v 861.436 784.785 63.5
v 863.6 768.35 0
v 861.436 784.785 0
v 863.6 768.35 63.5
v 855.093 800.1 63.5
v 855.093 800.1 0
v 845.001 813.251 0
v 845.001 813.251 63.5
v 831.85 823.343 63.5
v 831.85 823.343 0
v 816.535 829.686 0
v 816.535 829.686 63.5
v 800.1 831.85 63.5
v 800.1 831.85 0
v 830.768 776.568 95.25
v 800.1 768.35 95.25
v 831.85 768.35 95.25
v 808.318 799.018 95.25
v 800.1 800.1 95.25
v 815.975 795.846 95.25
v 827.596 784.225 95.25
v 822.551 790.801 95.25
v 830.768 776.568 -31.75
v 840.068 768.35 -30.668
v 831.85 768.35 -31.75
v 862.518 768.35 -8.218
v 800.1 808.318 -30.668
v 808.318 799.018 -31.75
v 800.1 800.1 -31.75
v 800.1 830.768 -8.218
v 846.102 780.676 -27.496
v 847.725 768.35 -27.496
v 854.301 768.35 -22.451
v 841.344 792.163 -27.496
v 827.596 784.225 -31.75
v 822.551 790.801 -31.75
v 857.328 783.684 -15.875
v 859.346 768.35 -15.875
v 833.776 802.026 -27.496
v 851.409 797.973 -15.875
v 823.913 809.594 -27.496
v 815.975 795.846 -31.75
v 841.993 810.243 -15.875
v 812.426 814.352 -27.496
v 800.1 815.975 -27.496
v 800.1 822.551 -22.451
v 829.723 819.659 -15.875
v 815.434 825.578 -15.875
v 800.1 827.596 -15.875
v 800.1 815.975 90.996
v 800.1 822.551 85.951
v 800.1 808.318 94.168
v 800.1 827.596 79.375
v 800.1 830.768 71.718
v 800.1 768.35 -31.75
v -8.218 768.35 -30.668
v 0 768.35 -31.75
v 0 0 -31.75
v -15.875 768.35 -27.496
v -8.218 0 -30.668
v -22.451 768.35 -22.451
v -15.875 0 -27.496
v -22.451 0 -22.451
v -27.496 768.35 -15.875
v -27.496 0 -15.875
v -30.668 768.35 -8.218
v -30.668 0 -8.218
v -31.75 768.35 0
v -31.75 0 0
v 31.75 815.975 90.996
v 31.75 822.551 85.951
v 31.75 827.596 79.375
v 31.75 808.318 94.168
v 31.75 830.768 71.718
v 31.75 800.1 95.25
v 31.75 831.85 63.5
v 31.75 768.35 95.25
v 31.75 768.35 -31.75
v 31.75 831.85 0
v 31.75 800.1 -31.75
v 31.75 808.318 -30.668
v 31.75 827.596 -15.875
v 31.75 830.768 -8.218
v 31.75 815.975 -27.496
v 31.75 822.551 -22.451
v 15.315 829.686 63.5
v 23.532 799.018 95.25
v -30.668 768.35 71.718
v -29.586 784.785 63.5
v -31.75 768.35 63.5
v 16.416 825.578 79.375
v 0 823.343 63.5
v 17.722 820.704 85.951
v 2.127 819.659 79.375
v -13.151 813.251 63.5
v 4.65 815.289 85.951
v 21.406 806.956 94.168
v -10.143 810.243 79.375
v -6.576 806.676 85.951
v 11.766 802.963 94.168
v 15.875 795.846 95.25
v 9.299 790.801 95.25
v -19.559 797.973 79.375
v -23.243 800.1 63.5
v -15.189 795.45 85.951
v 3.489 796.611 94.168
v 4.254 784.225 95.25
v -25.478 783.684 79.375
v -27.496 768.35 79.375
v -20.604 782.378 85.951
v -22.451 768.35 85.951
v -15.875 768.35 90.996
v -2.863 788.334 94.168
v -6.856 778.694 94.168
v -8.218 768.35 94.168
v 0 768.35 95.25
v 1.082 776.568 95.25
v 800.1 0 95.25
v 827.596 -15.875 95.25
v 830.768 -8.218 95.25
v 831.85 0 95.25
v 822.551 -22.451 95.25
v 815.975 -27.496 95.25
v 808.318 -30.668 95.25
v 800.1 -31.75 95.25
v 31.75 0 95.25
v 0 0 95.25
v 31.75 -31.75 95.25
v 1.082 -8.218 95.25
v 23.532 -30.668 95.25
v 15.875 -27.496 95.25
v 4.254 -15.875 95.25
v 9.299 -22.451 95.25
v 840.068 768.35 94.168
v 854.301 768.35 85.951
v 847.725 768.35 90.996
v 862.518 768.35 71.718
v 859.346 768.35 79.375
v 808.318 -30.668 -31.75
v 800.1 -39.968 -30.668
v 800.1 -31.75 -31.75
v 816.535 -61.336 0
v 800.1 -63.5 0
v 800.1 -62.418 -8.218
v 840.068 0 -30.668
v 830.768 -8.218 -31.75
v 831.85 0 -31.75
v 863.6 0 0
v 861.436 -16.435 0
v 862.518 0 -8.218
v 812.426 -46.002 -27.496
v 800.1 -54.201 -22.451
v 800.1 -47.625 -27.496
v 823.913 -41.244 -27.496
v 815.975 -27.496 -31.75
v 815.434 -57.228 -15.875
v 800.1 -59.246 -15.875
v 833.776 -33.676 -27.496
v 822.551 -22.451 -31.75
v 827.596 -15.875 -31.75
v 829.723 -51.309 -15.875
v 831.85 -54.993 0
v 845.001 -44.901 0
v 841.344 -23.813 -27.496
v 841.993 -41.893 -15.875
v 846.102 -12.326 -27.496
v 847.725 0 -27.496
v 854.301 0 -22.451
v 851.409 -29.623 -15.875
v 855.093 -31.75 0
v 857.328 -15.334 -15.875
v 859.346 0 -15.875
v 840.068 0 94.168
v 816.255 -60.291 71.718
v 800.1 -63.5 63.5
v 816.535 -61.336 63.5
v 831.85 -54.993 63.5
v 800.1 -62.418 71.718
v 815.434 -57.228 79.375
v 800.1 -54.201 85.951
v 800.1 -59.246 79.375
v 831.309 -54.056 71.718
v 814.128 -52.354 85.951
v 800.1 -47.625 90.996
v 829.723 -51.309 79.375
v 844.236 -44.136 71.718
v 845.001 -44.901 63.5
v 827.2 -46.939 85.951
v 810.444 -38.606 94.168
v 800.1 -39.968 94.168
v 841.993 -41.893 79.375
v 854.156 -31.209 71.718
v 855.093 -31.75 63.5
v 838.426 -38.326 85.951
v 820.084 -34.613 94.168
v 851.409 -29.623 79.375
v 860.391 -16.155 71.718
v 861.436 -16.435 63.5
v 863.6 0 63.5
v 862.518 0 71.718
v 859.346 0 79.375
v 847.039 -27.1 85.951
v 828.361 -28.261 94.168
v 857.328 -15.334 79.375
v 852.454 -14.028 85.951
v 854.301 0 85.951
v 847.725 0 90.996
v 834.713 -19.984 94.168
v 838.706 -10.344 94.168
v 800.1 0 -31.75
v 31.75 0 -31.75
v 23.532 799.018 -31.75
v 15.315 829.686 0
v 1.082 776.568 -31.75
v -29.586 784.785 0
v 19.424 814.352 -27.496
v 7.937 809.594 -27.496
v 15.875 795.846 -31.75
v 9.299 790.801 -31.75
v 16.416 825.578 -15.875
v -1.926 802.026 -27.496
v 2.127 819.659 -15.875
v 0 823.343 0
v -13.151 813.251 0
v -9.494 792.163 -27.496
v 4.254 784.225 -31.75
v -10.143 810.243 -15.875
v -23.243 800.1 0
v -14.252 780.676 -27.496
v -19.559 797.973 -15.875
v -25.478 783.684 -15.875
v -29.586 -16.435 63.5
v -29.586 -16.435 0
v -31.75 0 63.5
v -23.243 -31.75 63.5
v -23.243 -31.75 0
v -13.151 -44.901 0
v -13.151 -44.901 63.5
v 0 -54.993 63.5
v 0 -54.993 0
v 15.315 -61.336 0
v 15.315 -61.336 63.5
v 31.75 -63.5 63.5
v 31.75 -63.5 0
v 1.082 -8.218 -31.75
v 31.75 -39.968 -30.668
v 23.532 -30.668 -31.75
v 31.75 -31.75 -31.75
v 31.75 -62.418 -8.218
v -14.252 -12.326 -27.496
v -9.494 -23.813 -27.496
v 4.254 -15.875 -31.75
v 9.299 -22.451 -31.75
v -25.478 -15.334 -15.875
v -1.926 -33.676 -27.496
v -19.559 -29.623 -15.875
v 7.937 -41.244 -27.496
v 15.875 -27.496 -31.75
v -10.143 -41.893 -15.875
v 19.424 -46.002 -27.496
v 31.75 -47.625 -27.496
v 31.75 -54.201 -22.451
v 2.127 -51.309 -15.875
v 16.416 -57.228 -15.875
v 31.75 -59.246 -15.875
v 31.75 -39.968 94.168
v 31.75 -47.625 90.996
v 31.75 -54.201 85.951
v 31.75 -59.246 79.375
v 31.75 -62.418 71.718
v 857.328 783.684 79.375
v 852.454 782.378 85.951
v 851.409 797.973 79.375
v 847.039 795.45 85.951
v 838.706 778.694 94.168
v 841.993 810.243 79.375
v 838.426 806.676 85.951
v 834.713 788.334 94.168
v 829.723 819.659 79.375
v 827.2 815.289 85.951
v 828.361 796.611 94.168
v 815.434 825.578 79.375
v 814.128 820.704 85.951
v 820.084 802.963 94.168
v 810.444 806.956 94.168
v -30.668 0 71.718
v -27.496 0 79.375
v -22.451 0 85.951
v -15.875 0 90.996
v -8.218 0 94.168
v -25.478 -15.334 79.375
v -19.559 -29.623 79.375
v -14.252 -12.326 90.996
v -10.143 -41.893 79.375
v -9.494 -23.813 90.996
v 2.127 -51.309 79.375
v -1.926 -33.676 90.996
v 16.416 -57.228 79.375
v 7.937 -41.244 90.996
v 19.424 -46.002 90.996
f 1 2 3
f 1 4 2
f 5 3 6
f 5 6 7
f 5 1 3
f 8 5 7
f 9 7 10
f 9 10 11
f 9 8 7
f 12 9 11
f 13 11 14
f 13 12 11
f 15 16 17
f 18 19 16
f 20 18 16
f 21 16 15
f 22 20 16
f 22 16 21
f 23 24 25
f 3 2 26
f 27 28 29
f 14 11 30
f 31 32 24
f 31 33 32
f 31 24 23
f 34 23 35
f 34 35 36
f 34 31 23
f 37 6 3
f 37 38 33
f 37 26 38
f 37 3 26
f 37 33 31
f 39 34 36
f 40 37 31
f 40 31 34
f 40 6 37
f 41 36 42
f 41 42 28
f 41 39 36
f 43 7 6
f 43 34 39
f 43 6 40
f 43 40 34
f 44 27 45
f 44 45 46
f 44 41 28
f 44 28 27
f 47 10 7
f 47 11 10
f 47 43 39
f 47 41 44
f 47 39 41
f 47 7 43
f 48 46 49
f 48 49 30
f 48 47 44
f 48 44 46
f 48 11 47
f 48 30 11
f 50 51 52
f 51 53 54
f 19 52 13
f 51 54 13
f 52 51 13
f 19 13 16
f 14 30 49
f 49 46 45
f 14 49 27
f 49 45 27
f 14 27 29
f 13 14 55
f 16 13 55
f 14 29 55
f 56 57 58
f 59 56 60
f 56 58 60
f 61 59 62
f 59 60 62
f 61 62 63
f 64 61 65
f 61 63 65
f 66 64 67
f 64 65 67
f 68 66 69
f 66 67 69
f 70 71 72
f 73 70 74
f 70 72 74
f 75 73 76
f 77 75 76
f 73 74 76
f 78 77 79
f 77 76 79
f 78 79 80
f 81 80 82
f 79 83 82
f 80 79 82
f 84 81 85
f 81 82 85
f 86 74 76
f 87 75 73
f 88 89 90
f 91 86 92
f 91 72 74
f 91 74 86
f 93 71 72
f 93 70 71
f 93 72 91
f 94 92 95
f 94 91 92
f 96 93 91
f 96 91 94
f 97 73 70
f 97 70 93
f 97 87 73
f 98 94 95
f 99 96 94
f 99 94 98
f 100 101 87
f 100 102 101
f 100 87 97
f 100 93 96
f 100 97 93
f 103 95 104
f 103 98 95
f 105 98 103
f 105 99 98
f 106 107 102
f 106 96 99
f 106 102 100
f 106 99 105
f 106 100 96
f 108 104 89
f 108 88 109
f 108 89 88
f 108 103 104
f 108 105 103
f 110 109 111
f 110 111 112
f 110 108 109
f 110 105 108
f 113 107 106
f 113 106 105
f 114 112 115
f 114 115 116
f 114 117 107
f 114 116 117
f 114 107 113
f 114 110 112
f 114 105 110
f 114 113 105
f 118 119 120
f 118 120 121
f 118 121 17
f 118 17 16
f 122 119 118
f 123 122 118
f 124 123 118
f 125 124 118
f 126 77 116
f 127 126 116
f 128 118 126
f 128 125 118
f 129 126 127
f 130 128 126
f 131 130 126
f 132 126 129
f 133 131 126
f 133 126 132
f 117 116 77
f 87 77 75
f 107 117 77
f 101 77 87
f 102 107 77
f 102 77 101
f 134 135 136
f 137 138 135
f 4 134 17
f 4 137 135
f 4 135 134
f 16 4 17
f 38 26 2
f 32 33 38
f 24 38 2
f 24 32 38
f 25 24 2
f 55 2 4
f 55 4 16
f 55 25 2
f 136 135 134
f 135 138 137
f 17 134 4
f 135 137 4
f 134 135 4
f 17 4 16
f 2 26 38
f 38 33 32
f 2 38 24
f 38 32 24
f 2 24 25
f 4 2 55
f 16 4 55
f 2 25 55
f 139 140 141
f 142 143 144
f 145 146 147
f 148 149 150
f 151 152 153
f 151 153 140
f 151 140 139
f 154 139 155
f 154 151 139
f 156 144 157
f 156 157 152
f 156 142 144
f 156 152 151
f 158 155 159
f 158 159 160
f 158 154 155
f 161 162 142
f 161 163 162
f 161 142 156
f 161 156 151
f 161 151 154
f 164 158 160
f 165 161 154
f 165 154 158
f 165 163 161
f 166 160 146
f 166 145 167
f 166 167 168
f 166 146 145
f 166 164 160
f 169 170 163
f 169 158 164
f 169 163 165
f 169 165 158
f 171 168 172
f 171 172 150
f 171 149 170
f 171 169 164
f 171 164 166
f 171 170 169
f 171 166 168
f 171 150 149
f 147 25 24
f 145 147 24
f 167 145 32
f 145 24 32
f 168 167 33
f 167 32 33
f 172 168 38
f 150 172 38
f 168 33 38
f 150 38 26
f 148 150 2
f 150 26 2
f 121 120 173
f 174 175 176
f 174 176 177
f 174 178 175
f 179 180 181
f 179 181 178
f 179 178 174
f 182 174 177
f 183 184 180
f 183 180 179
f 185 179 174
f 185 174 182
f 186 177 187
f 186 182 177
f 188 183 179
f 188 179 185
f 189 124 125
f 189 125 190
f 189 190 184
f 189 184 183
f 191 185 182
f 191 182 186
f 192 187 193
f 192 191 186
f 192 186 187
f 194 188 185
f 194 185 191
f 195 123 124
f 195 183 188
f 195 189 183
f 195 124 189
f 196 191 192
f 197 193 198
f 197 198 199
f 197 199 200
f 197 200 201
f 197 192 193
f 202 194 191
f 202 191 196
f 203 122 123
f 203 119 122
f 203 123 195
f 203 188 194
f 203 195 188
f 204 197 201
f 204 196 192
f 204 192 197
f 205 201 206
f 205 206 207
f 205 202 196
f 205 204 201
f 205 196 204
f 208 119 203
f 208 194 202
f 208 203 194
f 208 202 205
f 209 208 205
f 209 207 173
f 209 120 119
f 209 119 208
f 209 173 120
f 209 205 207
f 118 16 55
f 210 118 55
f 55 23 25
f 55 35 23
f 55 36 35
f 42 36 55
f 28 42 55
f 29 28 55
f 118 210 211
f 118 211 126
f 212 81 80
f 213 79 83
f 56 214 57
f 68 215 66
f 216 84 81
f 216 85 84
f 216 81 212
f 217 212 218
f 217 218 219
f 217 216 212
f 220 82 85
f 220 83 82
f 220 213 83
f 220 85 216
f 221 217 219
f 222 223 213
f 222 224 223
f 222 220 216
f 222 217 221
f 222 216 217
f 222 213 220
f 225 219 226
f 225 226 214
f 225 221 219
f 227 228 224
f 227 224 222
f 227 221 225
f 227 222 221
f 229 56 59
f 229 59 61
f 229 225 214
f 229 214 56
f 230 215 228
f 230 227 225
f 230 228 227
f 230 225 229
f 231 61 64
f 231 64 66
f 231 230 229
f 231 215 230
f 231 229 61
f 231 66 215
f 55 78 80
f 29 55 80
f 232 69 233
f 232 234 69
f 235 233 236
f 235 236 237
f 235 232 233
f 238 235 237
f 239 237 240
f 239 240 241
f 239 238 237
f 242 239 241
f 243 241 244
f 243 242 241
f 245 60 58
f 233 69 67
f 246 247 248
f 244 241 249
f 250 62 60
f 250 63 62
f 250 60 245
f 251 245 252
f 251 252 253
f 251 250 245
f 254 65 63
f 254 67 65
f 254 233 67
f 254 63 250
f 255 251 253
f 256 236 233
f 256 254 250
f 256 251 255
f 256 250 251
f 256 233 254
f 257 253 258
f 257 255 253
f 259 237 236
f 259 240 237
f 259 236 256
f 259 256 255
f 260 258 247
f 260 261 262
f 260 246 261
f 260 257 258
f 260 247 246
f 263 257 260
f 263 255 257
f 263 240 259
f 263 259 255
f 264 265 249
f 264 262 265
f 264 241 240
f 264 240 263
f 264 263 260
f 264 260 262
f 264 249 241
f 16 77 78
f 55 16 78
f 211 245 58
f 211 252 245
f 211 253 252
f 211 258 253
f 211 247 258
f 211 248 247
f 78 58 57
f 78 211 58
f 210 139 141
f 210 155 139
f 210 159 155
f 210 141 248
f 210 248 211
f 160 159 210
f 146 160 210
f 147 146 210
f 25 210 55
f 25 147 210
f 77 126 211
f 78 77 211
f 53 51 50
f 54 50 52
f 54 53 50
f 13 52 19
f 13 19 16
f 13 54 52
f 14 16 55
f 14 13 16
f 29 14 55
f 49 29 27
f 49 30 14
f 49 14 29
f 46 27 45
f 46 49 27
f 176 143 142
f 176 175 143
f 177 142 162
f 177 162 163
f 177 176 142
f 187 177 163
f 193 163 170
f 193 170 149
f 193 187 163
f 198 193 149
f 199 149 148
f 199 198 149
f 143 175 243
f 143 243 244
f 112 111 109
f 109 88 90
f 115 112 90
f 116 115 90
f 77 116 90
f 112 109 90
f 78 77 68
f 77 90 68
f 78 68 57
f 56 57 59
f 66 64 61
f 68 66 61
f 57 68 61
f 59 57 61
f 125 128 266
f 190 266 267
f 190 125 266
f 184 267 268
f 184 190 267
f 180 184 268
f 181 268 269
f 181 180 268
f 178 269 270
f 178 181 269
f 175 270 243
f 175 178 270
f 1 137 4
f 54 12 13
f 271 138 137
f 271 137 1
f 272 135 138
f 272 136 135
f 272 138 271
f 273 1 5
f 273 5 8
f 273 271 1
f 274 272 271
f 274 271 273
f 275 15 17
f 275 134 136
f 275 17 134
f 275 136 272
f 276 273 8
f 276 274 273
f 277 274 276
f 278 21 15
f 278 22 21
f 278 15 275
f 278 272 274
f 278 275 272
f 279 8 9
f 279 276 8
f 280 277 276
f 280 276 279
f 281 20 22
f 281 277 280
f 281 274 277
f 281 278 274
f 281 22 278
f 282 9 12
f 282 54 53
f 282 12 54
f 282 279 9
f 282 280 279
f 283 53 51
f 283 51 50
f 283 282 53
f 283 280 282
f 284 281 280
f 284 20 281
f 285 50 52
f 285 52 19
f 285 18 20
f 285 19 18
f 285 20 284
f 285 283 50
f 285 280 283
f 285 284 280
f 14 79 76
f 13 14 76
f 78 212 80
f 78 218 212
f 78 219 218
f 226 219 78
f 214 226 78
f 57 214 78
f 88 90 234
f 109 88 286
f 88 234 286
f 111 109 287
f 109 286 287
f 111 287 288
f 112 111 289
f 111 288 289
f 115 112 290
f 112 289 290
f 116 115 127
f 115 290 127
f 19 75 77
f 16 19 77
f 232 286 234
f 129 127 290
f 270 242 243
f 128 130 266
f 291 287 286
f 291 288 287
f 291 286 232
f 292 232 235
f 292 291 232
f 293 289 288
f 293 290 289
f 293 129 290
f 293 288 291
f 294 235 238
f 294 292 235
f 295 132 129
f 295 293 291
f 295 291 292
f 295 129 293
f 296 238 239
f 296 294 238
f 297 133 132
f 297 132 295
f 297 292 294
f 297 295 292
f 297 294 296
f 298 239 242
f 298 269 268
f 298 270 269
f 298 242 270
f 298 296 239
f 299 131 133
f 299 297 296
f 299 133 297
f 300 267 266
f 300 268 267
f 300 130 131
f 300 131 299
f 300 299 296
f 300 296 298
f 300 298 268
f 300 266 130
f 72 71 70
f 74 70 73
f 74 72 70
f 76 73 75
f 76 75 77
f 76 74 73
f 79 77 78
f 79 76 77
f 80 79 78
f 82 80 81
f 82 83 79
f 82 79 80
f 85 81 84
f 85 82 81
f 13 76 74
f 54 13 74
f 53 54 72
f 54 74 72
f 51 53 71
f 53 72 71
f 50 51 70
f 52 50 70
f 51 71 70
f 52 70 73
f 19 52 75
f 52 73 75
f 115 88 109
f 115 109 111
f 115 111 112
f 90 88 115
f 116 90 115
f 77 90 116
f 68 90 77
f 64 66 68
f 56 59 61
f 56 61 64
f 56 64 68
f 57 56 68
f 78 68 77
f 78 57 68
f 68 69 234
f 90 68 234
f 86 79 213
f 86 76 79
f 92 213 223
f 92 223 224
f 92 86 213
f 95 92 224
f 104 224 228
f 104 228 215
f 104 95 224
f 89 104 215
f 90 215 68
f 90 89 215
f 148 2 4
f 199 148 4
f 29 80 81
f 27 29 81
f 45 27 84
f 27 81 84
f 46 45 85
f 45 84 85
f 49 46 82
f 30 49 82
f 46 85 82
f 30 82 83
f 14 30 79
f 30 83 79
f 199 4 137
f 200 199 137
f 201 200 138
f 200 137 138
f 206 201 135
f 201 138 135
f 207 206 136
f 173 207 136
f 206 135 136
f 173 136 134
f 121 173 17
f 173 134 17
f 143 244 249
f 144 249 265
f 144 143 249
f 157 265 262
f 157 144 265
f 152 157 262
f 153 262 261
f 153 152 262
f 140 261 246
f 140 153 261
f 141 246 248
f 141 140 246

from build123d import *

# Parameters (mm, degrees)
BOSS_EXTRUDE1_DEPTH = 768.35
BOSS_EXTRUDE2_DEPTH = 768.35
BOSS_EXTRUDE3_DEPTH = 768.35
BOSS_EXTRUDE4_DEPTH = 768.35
REVOLVE2_ANGLE      = 90
REVOLVE3_ANGLE      = 90
REVOLVE8_ANGLE      = 90
REVOLVE10_ANGLE     = 90


# Read off the part's stored shape, not the designer's step: Revolve2, Revolve3
with BuildPart() as part:
    # Sketch2 → Boss-Extrude1 (new body)
    with BuildSketch(Plane(origin=(0, 0, 0), x_dir=(1, 0, 0), z_dir=(0, 1, 0))):
        with BuildLine():
            Line((31.75, 31.75), (0, 31.75))
            ThreePointArc((0, 31.75), (-22.450640303, 22.450640303), (-31.75, 0))
            Line((-31.75, 0), (-31.75, -63.5))
            ThreePointArc((-31.75, -63.5), (-22.450640303, -85.950640303), (0, -95.25))
            Line((0, -95.25), (31.75, -95.25))
            Line((31.75, -95.25), (31.75, 31.75))
        make_face()
    extrude(amount=BOSS_EXTRUDE1_DEPTH)



with BuildPart() as body_2:
    # Sketch7 → Boss-Extrude2 (new body)
    with BuildSketch(Plane(origin=(31.75, 0, 0), x_dir=(0, 0, -1), z_dir=(1, 0, 0))):
        with BuildLine():
            Line((31.75, 768.35), (31.75, 800.1))
            ThreePointArc((31.75, 800.1), (22.450640303, 822.550640303), (0, 831.85))
            Line((0, 831.85), (-63.5, 831.85))
            ThreePointArc((-63.5, 831.85), (-85.950640303, 822.550640303), (-95.25, 800.1))
            Line((-95.25, 800.1), (-95.25, 768.35))
            Line((-95.25, 768.35), (31.75, 768.35))
        make_face()
    extrude(amount=BOSS_EXTRUDE2_DEPTH)


with BuildPart() as body_3:
    # Sketch9 → Boss-Extrude3 (new body)
    with BuildSketch(Plane(origin=(0, 768.35, 0), x_dir=(-1, 0, 0), z_dir=(0, -1, 0))):
        with BuildLine():
            Line((-800.1, -95.25), (-800.1, 31.75))
            Line((-800.1, 31.75), (-831.85, 31.75))
            ThreePointArc((-831.85, 31.75), (-854.300640303, 22.450640303), (-863.6, 0))
            Line((-863.6, 0), (-863.6, -63.5))
            ThreePointArc((-863.6, -63.5), (-854.300640303, -85.950640303), (-831.85, -95.25))
            Line((-831.85, -95.25), (-800.1, -95.25))
        make_face()
    extrude(amount=BOSS_EXTRUDE3_DEPTH)


with BuildPart() as body_4:
    # Sketch10 → Boss-Extrude4 (new body)
    with BuildSketch(Plane.ZY.offset(-800.1)):
        with BuildLine():
            Line((95.25, 0), (95.25, -31.75))
            ThreePointArc((95.25, -31.75), (85.950640303, -54.200640303), (63.5, -63.5))
            Line((63.5, -63.5), (0, -63.5))
            ThreePointArc((0, -63.5), (-22.450640303, -54.200640303), (-31.75, -31.75))
            Line((-31.75, -31.75), (-31.75, 0))
            Line((-31.75, 0), (95.25, 0))
        make_face()
    extrude(amount=BOSS_EXTRUDE4_DEPTH)


with BuildPart() as part_1:
    add(part.part)

    add(body_4.part)  # Revolve2 merges body 4
    # Revolve2 outline → Revolve2 (revolve)
    with BuildSketch(Plane(origin=(31.75, 0, 0), x_dir=(-1, 0, 0), z_dir=(0, 1, 0))):
        with BuildLine():
            Line((31.75, 95.25), (0, 95.25))
            Line((0, 95.25), (0, -31.75))
            Line((0, -31.75), (31.75, -31.75))
            ThreePointArc((31.75, -31.75), (54.200640303, -22.450640303), (63.5, 0))
            Line((63.5, 0), (63.5, 63.5))
            ThreePointArc((63.5, 63.5), (54.200640303, 85.950640303), (31.75, 95.25))
        make_face()
    revolve(axis=Axis((31.75, 0, 0), (0, 0, 1)), revolution_arc=REVOLVE2_ANGLE)


    add(body_3.part)  # Revolve3 merges body 3
    # Revolve3 outline → Revolve3 (revolve)
    with BuildSketch(Plane(origin=(800.1, 0, 0), x_dir=(0, -1, 0), z_dir=(-1, 0, 0))):
        with BuildLine():
            Line((0, 95.25), (0, -31.75))
            Line((0, -31.75), (31.75, -31.75))
            ThreePointArc((31.75, -31.75), (54.200640303, -22.450640303), (63.5, 0))
            Line((63.5, 0), (63.5, 63.5))
            ThreePointArc((63.5, 63.5), (54.200640303, 85.950640303), (31.75, 95.25))
            Line((31.75, 95.25), (0, 95.25))
        make_face()
    revolve(axis=Axis((800.1, 0, 0), (0, 0, 1)), revolution_arc=REVOLVE3_ANGLE)


with BuildPart() as body_3_2:
    # Sketch7<3> → Revolve8 (revolve)
    with BuildSketch(Plane(origin=(31.75, 0, 0), x_dir=(0, 0, -1), z_dir=(1, 0, 0))):
        with BuildLine():
            Line((31.75, 768.35), (31.75, 800.1))
            ThreePointArc((31.75, 800.1), (22.450640303, 822.550640303), (0, 831.85))
            Line((0, 831.85), (-63.5, 831.85))
            ThreePointArc((-63.5, 831.85), (-85.950640303, 822.550640303), (-95.25, 800.1))
            Line((-95.25, 800.1), (-95.25, 768.35))
            Line((-95.25, 768.35), (31.75, 768.35))
        make_face()
    revolve(axis=Axis((31.75, 768.35, 95.25), (0, 0, 1)), revolution_arc=REVOLVE8_ANGLE)


with BuildPart() as body_4_2:
    # Sketch9<2> → Revolve10 (revolve)
    with BuildSketch(Plane(origin=(0, 768.35, 0), x_dir=(-1, 0, 0), z_dir=(0, -1, 0))):
        with BuildLine():
            Line((-800.1, -95.25), (-800.1, 31.75))
            Line((-800.1, 31.75), (-831.85, 31.75))
            ThreePointArc((-831.85, 31.75), (-854.300640303, 22.450640303), (-863.6, 0))
            Line((-863.6, 0), (-863.6, -63.5))
            ThreePointArc((-863.6, -63.5), (-854.300640303, -85.950640303), (-831.85, -95.25))
            Line((-831.85, -95.25), (-800.1, -95.25))
        make_face()
    revolve(axis=Axis((800.1, 768.35, 95.25), (0, 0, 1)), revolution_arc=REVOLVE10_ANGLE)


solid = Compound([body_2.part, part_1.part, body_3_2.part, body_4_2.part])
